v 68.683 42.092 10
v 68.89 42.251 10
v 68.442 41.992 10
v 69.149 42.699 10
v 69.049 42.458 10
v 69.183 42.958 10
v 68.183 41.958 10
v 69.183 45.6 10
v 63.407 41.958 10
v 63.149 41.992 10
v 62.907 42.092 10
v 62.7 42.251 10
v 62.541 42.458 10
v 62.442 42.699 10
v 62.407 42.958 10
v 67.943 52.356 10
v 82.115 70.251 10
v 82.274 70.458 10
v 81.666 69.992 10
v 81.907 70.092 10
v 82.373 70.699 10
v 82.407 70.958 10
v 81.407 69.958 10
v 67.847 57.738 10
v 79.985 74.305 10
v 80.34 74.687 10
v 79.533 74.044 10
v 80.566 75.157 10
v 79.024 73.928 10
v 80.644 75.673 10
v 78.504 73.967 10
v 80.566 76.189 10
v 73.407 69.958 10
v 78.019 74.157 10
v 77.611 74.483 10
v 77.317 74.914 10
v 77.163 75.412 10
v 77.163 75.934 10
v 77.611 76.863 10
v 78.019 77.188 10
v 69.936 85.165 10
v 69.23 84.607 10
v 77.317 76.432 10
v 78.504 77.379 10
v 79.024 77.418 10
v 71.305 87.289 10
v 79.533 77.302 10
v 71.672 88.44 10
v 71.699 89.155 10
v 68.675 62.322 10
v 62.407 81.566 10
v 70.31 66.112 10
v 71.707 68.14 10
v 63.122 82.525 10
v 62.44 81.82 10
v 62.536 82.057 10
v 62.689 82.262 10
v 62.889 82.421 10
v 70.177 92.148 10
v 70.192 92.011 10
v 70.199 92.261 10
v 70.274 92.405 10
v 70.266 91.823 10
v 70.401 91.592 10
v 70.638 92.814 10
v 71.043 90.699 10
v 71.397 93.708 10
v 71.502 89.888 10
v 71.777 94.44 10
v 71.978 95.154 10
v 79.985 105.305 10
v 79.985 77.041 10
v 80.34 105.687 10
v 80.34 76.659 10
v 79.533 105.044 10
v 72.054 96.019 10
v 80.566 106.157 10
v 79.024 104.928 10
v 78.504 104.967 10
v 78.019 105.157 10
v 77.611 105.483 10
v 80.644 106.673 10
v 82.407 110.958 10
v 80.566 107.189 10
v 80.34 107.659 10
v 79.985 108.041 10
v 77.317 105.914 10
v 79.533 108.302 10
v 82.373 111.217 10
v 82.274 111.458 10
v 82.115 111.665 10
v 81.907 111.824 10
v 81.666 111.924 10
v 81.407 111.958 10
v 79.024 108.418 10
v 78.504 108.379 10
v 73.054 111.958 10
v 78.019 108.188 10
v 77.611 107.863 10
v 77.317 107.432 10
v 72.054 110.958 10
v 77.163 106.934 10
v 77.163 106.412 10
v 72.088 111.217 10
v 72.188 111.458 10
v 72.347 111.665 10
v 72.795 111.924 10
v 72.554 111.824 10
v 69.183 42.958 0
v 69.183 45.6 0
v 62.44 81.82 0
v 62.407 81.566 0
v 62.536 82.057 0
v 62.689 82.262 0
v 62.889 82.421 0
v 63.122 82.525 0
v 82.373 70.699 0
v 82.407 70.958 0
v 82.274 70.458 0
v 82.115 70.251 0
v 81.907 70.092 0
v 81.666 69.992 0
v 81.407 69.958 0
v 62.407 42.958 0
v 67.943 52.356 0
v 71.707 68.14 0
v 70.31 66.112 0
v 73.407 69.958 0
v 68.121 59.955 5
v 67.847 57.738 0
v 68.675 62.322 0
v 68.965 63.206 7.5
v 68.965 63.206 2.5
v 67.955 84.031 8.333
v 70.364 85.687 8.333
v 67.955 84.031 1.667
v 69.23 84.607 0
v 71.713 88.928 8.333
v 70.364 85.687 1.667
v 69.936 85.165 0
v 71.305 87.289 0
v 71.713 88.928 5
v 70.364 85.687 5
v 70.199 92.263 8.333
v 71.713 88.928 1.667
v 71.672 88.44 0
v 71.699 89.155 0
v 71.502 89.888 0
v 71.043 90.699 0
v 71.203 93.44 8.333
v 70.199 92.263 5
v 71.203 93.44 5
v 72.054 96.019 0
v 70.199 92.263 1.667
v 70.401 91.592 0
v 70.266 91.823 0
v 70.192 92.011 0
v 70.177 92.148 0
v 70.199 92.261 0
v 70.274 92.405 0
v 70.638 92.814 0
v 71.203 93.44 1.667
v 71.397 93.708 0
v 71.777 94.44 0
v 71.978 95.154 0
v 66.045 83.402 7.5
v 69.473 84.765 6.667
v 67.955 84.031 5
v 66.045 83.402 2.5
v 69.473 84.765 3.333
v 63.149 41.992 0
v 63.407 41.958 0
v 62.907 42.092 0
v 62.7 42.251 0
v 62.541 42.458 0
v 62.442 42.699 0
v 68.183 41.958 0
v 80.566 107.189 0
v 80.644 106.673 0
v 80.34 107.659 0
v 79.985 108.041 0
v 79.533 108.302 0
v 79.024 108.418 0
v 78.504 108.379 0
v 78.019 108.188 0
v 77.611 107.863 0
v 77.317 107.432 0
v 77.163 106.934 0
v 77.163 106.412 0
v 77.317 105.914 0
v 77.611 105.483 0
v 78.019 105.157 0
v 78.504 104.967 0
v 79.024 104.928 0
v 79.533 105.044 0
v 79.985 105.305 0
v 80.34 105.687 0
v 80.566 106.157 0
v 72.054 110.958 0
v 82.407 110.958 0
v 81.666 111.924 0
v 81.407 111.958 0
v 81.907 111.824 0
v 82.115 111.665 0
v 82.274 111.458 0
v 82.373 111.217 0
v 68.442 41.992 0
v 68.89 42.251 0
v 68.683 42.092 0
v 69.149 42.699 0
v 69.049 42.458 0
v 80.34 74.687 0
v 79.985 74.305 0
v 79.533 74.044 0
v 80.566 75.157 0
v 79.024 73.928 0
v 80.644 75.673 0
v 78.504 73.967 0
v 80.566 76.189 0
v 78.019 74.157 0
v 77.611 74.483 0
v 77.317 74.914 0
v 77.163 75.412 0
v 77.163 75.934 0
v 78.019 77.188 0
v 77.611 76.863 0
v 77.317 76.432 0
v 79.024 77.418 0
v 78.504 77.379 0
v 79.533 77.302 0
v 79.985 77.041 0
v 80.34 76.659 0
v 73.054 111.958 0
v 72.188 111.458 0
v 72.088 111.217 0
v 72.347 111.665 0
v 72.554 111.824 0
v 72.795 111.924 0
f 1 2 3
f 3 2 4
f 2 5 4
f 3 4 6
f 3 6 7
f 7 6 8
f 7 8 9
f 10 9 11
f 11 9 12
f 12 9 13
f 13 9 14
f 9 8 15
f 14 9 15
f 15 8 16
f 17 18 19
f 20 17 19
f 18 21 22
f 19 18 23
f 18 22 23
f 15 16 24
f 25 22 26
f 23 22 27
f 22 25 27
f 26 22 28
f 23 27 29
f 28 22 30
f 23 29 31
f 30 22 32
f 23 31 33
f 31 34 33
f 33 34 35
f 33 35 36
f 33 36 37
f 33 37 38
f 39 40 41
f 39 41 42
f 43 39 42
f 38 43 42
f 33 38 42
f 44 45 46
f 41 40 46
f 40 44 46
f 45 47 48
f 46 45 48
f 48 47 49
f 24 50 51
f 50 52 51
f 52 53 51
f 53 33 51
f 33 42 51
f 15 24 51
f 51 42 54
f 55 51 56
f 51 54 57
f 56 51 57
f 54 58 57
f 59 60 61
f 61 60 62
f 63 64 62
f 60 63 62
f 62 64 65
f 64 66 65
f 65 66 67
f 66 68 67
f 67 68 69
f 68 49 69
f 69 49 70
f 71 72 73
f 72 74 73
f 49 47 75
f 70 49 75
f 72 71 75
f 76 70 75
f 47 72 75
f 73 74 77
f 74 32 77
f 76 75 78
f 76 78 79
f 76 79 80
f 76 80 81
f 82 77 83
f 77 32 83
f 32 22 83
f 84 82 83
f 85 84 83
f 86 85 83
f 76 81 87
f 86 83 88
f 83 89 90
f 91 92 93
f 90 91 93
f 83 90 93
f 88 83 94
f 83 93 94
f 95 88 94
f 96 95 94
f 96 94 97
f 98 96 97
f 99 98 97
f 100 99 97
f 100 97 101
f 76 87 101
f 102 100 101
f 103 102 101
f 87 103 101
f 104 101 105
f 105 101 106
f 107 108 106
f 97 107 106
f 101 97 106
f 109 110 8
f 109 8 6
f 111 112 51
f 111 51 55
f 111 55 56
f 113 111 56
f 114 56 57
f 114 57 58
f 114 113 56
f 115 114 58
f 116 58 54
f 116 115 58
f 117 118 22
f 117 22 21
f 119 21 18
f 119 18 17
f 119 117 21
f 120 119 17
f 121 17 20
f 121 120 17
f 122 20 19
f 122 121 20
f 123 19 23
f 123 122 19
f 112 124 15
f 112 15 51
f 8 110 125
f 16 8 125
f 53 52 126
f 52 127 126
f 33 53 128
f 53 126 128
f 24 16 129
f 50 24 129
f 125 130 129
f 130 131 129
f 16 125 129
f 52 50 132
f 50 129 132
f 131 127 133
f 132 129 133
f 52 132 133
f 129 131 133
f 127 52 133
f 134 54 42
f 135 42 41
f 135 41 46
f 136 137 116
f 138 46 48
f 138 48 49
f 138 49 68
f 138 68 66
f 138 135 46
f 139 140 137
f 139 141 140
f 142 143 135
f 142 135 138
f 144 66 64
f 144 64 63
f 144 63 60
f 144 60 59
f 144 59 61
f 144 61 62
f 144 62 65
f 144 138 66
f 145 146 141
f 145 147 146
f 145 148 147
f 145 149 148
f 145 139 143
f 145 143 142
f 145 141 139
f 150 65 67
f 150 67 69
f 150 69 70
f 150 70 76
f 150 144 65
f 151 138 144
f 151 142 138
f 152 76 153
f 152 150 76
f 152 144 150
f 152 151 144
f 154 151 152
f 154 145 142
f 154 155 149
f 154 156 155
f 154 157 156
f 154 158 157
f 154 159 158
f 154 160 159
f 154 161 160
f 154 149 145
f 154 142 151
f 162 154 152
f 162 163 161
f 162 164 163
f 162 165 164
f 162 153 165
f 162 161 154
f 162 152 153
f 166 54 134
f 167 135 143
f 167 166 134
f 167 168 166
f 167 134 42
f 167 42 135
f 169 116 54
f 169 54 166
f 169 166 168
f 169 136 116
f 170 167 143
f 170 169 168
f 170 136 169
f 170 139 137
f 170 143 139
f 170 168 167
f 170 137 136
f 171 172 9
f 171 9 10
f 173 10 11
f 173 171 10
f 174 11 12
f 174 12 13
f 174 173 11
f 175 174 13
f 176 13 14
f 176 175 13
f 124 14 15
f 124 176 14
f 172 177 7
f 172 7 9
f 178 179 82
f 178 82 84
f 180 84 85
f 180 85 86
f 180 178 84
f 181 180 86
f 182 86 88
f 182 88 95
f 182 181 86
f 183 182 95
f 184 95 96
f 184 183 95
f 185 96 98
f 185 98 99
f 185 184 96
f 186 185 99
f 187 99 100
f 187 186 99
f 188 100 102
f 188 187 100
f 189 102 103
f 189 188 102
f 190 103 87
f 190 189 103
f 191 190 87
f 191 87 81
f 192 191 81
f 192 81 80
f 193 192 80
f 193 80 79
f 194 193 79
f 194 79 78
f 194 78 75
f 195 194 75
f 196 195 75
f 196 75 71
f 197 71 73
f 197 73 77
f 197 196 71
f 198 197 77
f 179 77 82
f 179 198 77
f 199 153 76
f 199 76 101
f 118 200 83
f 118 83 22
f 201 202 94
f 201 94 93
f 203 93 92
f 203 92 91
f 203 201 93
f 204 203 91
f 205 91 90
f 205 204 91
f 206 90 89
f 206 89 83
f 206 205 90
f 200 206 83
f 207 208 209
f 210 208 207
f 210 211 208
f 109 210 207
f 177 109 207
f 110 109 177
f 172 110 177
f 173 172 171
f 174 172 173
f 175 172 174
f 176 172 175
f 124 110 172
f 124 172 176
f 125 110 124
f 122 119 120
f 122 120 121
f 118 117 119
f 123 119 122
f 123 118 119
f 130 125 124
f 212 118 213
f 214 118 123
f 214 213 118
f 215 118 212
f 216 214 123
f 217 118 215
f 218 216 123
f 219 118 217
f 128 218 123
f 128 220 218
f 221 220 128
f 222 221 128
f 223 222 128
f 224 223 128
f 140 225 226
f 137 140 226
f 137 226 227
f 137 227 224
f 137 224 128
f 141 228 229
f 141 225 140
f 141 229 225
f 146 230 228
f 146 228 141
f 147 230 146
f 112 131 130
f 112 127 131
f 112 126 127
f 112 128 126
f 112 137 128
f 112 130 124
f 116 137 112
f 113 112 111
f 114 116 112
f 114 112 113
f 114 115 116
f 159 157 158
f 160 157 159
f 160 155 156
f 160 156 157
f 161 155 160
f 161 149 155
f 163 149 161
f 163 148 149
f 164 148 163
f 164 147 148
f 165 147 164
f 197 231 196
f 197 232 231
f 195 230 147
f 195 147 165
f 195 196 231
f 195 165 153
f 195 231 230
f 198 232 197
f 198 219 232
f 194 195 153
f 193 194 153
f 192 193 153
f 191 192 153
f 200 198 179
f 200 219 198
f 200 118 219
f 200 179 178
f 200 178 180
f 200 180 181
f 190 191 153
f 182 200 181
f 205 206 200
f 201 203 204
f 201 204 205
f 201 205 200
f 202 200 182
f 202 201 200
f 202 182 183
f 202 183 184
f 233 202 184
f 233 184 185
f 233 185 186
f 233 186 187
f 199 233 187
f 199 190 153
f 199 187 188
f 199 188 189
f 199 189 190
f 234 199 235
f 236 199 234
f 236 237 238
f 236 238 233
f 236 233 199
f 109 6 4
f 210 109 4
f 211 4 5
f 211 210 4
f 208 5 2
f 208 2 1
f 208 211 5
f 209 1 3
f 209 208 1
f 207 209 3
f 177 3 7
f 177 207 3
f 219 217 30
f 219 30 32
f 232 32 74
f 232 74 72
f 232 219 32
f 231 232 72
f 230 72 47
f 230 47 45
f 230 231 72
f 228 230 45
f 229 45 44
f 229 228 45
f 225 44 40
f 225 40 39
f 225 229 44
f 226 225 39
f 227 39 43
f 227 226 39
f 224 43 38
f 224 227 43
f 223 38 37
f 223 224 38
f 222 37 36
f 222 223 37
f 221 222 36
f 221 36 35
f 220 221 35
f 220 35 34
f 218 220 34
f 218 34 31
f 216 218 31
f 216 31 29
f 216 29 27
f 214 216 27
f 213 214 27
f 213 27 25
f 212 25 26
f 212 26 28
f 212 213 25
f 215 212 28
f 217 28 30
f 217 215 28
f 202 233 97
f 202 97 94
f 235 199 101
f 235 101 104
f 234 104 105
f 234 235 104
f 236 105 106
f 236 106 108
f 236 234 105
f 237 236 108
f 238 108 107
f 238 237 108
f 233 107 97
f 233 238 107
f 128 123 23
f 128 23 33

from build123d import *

# Parameters (mm, degrees)
SKETCH1_R           = 1.75
BOSS_EXTRUDE1_DEPTH = 10


with BuildPart() as part:
    # Sketch1 → Boss-Extrude1 (new body)
    with BuildSketch(Plane.XY):
        with BuildLine():
            Line((73.053682236, 111.958146332), (81.407497616, 111.958146332))
            ThreePointArc((81.407497616, 111.958146332), (82.114604398, 111.665253114), (82.407497616, 110.958146332))
            Line((82.407497616, 110.958146332), (82.407497616, 70.958146332))
            ThreePointArc((82.407497616, 70.958146332), (82.114604398, 70.251039551), (81.407497616, 69.958146332))
            Line((81.407497616, 69.958146332), (73.407497616, 69.958146332))
            add(Edge.make_bspline(
                [(69.182828204, 45.599922824), (64.94615604, 62.131405374), (73.407497616, 69.958146332)],
                knots=[0, 0, 0, 1, 1, 1], degree=2))
            Line((69.182828204, 45.599922824), (69.182828204, 42.958146332))
            ThreePointArc((69.182828204, 42.958146332), (68.889934985, 42.251039551), (68.182828204, 41.958146332))
            Line((68.182828204, 41.958146332), (63.407497616, 41.958146332))
            ThreePointArc((63.407497616, 41.958146332), (62.700390835, 42.251039551), (62.407497616, 42.958146332))
            Line((62.407497616, 42.958146332), (62.407497616, 81.5661721))
            ThreePointArc((62.407497616, 81.5661721), (62.605849898, 82.163968834), (63.122219487, 82.524616876))
            add(Edge.make_bspline(
                [(63.122219487, 82.524616876), (67.821663275, 83.923391816), (69.297708233, 84.346422766), (70.793118302, 86.197707517), (72.619735364, 89.442432773), (70.361342971, 91.342709778), (70.002118619, 92.666400755), (72.053682236, 93.570600079), (72.053682236, 96.019092409)],
                knots=[0.012469808, 0.012469808, 0.012469808, 0.012469808, 0.267445708, 0.317679419, 0.514806914, 0.751762402, 0.800281711, 1, 1, 1, 1], degree=3))
            Line((72.053682236, 96.019092409), (72.053682236, 110.958146332))
            ThreePointArc((72.053682236, 110.958146332), (72.346575455, 111.665253114), (73.053682236, 111.958146332))
        make_face()
        with Locations((78.893605795, 106.672950269)):
            Circle(SKETCH1_R, mode=Mode.SUBTRACT)
        with Locations((78.893605795, 75.672950269)):
            Circle(SKETCH1_R, mode=Mode.SUBTRACT)
    extrude(amount=BOSS_EXTRUDE1_DEPTH)


solid = part.part
